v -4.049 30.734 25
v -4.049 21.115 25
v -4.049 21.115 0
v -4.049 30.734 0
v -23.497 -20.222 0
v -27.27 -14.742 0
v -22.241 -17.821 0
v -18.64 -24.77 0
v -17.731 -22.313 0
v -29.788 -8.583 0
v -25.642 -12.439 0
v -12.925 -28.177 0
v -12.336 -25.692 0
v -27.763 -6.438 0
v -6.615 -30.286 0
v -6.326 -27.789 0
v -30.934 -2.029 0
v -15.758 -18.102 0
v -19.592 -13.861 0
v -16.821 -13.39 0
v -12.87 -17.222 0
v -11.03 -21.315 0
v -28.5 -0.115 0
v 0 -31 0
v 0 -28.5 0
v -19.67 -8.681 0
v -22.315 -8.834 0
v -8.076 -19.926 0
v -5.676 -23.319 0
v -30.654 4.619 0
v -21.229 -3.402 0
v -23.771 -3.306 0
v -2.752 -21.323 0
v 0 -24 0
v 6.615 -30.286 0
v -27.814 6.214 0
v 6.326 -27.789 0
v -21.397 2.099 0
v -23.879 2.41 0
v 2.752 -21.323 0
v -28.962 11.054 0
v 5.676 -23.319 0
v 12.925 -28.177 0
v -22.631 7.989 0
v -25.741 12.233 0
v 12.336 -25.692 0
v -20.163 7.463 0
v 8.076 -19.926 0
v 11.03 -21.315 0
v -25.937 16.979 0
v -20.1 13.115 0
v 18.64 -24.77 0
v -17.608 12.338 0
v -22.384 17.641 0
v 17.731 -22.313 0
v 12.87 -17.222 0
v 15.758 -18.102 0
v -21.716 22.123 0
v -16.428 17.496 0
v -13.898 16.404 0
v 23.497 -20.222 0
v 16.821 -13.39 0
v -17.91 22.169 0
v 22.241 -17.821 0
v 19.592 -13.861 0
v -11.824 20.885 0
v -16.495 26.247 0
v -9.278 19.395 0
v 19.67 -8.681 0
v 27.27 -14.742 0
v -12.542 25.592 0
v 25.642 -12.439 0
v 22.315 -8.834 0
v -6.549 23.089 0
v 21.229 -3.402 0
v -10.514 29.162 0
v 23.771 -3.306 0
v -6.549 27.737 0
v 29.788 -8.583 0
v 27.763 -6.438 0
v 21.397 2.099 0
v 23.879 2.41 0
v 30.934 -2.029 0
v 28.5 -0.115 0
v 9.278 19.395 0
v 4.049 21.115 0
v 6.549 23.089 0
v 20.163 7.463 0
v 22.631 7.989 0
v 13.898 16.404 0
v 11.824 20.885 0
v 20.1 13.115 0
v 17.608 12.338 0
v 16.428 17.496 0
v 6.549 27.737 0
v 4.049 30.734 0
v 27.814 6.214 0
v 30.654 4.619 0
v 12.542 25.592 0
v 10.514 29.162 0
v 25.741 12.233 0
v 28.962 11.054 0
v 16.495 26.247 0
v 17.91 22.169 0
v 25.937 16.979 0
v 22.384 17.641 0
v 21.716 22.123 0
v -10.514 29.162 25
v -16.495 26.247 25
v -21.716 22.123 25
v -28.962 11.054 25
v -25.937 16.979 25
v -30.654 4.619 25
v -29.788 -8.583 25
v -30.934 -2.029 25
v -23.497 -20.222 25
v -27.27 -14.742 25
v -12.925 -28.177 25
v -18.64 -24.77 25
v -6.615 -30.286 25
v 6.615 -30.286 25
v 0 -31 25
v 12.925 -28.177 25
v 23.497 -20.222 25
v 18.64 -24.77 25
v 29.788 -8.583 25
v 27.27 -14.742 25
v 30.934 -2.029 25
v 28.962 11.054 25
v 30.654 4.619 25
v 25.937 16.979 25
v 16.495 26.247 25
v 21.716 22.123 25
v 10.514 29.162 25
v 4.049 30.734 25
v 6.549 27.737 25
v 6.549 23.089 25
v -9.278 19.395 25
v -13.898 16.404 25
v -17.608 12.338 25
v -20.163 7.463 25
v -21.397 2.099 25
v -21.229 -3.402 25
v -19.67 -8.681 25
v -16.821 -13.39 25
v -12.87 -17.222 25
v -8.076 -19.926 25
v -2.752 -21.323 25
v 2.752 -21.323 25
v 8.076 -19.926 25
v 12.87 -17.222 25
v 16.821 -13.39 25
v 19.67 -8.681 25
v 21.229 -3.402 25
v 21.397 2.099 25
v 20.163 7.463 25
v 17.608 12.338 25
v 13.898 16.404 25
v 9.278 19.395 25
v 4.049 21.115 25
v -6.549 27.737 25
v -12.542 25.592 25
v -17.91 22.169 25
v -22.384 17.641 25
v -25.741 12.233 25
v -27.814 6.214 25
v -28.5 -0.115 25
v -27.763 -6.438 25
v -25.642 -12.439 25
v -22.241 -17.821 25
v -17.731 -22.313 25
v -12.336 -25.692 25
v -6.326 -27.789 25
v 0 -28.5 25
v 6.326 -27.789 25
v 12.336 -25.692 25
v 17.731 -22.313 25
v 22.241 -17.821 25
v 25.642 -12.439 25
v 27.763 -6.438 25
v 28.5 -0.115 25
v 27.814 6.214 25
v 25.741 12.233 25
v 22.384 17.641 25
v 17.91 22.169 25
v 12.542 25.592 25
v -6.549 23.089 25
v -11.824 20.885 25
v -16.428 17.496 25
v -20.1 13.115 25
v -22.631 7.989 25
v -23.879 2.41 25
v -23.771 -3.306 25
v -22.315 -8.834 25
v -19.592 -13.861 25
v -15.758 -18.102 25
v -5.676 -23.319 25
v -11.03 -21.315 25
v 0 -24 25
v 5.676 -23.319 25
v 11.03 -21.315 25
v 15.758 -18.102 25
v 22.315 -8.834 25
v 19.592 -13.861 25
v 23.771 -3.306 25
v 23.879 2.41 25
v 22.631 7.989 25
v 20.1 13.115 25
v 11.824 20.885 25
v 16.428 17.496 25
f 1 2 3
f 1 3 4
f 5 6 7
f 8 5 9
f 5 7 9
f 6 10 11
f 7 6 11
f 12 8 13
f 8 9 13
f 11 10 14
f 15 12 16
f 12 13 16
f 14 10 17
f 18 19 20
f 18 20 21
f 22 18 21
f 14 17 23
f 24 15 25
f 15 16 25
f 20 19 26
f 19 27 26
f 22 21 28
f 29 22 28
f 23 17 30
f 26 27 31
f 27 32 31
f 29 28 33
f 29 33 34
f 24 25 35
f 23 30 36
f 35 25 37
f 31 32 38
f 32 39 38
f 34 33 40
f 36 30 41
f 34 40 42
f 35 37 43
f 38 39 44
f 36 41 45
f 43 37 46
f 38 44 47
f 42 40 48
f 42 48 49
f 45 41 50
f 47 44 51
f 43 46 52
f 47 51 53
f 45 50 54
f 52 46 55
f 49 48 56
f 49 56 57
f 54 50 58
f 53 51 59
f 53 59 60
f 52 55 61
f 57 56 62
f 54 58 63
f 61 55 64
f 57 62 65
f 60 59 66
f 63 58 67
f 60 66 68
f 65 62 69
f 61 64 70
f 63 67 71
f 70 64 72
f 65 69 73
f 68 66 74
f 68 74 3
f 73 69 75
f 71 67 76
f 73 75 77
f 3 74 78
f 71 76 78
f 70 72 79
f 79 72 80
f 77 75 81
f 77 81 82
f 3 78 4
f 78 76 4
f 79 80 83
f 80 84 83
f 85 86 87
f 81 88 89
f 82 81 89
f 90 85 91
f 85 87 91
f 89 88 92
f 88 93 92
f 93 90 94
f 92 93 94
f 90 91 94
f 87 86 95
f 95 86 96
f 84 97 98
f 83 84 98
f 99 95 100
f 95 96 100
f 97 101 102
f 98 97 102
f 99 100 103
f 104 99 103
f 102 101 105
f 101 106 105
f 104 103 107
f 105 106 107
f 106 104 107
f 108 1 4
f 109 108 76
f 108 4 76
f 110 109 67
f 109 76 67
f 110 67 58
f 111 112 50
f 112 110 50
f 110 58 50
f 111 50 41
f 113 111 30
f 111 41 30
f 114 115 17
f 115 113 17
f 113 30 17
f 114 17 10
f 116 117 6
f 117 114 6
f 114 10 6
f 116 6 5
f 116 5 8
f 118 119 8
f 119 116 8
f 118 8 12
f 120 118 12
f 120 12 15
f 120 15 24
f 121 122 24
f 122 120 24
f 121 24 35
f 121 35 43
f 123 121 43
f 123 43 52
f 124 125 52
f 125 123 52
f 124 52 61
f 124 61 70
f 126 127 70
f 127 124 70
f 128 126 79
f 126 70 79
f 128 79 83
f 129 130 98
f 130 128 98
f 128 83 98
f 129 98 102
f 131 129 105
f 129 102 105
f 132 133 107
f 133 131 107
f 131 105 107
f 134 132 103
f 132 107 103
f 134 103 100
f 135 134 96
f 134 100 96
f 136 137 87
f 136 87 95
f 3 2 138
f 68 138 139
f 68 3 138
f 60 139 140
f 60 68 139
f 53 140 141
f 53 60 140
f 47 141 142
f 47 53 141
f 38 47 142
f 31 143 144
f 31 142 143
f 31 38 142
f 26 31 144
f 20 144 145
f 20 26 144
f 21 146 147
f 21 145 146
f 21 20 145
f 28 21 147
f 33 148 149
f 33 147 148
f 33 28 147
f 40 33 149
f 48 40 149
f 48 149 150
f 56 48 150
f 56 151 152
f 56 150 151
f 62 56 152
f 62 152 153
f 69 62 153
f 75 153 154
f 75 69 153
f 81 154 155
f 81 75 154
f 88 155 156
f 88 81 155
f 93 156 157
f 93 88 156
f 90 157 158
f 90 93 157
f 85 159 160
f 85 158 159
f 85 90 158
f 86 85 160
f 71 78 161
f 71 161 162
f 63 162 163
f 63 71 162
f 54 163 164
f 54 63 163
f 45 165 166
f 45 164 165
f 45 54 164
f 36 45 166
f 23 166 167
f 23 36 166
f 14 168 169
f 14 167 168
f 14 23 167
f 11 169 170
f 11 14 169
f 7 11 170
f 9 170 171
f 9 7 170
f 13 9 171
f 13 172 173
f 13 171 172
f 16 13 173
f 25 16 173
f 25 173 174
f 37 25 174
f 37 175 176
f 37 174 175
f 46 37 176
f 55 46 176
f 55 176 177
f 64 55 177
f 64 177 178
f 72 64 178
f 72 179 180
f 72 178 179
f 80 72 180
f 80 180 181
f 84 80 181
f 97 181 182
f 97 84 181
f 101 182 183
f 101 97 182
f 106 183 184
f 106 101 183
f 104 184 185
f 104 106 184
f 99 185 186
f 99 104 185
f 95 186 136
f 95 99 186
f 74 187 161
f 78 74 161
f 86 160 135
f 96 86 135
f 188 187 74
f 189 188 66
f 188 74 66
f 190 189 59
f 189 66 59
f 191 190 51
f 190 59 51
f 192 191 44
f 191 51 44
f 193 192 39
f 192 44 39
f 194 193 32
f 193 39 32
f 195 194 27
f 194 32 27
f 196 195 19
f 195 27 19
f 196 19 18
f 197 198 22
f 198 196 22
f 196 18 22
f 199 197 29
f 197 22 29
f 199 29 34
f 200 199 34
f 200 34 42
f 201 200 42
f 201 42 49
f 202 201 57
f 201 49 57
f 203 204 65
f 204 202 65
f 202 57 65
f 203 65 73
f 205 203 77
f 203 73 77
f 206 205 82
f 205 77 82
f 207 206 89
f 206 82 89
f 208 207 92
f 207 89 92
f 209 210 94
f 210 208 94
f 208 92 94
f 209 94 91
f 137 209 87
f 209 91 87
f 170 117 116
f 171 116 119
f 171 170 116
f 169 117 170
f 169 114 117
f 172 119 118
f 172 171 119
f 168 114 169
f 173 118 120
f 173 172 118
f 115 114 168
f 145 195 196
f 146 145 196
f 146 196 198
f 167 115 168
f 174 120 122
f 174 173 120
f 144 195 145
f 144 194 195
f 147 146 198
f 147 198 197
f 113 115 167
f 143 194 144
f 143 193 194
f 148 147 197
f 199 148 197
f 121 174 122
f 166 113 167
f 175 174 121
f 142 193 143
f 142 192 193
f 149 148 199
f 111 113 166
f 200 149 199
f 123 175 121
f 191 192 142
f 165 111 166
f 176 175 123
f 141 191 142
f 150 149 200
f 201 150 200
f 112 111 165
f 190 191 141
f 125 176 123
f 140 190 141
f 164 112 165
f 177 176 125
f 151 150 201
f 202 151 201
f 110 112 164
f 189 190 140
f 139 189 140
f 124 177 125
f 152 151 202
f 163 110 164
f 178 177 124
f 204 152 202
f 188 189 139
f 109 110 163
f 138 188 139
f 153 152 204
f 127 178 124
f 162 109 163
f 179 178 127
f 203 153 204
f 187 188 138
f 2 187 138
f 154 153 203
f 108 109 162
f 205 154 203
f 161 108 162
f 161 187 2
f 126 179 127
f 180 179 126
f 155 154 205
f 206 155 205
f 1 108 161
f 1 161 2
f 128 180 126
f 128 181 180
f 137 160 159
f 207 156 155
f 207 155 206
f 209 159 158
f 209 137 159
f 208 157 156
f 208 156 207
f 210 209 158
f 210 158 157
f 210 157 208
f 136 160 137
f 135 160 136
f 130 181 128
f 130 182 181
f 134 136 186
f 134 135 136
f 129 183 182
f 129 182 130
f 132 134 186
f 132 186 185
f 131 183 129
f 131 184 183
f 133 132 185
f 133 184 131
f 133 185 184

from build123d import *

# Parameters (mm, degrees)
F0_R     = 31
F0_R_2   = 21.5
F1_DEPTH = 25
F2_W     = 8.098436
F2_H     = 15.167526
F3_DEPTH = 25
F4_T     = -2.5


with BuildPart() as f1:
    # F0 (on Top) → F1 (new body)
    with BuildSketch(Plane.XY):
        Circle(F0_R)
        Circle(F0_R_2, mode=Mode.SUBTRACT)
    extrude(amount=F1_DEPTH)

    # F2 (on face) → F3 (cut)
    with BuildSketch(Plane.XY.offset(25)):
        with Locations((0, 25.295008)):
            Rectangle(F2_W, F2_H)
    extrude(amount=-F3_DEPTH, mode=Mode.SUBTRACT)

    # F4
    f4_openings = [f1.faces().sort_by_distance(p)[0] for p in [
        (0, -30.125064, 0),
        (-4.924154, 25.92483, 25),
    ]]
    offset(amount=F4_T, openings=f4_openings)


solid = f1.part
